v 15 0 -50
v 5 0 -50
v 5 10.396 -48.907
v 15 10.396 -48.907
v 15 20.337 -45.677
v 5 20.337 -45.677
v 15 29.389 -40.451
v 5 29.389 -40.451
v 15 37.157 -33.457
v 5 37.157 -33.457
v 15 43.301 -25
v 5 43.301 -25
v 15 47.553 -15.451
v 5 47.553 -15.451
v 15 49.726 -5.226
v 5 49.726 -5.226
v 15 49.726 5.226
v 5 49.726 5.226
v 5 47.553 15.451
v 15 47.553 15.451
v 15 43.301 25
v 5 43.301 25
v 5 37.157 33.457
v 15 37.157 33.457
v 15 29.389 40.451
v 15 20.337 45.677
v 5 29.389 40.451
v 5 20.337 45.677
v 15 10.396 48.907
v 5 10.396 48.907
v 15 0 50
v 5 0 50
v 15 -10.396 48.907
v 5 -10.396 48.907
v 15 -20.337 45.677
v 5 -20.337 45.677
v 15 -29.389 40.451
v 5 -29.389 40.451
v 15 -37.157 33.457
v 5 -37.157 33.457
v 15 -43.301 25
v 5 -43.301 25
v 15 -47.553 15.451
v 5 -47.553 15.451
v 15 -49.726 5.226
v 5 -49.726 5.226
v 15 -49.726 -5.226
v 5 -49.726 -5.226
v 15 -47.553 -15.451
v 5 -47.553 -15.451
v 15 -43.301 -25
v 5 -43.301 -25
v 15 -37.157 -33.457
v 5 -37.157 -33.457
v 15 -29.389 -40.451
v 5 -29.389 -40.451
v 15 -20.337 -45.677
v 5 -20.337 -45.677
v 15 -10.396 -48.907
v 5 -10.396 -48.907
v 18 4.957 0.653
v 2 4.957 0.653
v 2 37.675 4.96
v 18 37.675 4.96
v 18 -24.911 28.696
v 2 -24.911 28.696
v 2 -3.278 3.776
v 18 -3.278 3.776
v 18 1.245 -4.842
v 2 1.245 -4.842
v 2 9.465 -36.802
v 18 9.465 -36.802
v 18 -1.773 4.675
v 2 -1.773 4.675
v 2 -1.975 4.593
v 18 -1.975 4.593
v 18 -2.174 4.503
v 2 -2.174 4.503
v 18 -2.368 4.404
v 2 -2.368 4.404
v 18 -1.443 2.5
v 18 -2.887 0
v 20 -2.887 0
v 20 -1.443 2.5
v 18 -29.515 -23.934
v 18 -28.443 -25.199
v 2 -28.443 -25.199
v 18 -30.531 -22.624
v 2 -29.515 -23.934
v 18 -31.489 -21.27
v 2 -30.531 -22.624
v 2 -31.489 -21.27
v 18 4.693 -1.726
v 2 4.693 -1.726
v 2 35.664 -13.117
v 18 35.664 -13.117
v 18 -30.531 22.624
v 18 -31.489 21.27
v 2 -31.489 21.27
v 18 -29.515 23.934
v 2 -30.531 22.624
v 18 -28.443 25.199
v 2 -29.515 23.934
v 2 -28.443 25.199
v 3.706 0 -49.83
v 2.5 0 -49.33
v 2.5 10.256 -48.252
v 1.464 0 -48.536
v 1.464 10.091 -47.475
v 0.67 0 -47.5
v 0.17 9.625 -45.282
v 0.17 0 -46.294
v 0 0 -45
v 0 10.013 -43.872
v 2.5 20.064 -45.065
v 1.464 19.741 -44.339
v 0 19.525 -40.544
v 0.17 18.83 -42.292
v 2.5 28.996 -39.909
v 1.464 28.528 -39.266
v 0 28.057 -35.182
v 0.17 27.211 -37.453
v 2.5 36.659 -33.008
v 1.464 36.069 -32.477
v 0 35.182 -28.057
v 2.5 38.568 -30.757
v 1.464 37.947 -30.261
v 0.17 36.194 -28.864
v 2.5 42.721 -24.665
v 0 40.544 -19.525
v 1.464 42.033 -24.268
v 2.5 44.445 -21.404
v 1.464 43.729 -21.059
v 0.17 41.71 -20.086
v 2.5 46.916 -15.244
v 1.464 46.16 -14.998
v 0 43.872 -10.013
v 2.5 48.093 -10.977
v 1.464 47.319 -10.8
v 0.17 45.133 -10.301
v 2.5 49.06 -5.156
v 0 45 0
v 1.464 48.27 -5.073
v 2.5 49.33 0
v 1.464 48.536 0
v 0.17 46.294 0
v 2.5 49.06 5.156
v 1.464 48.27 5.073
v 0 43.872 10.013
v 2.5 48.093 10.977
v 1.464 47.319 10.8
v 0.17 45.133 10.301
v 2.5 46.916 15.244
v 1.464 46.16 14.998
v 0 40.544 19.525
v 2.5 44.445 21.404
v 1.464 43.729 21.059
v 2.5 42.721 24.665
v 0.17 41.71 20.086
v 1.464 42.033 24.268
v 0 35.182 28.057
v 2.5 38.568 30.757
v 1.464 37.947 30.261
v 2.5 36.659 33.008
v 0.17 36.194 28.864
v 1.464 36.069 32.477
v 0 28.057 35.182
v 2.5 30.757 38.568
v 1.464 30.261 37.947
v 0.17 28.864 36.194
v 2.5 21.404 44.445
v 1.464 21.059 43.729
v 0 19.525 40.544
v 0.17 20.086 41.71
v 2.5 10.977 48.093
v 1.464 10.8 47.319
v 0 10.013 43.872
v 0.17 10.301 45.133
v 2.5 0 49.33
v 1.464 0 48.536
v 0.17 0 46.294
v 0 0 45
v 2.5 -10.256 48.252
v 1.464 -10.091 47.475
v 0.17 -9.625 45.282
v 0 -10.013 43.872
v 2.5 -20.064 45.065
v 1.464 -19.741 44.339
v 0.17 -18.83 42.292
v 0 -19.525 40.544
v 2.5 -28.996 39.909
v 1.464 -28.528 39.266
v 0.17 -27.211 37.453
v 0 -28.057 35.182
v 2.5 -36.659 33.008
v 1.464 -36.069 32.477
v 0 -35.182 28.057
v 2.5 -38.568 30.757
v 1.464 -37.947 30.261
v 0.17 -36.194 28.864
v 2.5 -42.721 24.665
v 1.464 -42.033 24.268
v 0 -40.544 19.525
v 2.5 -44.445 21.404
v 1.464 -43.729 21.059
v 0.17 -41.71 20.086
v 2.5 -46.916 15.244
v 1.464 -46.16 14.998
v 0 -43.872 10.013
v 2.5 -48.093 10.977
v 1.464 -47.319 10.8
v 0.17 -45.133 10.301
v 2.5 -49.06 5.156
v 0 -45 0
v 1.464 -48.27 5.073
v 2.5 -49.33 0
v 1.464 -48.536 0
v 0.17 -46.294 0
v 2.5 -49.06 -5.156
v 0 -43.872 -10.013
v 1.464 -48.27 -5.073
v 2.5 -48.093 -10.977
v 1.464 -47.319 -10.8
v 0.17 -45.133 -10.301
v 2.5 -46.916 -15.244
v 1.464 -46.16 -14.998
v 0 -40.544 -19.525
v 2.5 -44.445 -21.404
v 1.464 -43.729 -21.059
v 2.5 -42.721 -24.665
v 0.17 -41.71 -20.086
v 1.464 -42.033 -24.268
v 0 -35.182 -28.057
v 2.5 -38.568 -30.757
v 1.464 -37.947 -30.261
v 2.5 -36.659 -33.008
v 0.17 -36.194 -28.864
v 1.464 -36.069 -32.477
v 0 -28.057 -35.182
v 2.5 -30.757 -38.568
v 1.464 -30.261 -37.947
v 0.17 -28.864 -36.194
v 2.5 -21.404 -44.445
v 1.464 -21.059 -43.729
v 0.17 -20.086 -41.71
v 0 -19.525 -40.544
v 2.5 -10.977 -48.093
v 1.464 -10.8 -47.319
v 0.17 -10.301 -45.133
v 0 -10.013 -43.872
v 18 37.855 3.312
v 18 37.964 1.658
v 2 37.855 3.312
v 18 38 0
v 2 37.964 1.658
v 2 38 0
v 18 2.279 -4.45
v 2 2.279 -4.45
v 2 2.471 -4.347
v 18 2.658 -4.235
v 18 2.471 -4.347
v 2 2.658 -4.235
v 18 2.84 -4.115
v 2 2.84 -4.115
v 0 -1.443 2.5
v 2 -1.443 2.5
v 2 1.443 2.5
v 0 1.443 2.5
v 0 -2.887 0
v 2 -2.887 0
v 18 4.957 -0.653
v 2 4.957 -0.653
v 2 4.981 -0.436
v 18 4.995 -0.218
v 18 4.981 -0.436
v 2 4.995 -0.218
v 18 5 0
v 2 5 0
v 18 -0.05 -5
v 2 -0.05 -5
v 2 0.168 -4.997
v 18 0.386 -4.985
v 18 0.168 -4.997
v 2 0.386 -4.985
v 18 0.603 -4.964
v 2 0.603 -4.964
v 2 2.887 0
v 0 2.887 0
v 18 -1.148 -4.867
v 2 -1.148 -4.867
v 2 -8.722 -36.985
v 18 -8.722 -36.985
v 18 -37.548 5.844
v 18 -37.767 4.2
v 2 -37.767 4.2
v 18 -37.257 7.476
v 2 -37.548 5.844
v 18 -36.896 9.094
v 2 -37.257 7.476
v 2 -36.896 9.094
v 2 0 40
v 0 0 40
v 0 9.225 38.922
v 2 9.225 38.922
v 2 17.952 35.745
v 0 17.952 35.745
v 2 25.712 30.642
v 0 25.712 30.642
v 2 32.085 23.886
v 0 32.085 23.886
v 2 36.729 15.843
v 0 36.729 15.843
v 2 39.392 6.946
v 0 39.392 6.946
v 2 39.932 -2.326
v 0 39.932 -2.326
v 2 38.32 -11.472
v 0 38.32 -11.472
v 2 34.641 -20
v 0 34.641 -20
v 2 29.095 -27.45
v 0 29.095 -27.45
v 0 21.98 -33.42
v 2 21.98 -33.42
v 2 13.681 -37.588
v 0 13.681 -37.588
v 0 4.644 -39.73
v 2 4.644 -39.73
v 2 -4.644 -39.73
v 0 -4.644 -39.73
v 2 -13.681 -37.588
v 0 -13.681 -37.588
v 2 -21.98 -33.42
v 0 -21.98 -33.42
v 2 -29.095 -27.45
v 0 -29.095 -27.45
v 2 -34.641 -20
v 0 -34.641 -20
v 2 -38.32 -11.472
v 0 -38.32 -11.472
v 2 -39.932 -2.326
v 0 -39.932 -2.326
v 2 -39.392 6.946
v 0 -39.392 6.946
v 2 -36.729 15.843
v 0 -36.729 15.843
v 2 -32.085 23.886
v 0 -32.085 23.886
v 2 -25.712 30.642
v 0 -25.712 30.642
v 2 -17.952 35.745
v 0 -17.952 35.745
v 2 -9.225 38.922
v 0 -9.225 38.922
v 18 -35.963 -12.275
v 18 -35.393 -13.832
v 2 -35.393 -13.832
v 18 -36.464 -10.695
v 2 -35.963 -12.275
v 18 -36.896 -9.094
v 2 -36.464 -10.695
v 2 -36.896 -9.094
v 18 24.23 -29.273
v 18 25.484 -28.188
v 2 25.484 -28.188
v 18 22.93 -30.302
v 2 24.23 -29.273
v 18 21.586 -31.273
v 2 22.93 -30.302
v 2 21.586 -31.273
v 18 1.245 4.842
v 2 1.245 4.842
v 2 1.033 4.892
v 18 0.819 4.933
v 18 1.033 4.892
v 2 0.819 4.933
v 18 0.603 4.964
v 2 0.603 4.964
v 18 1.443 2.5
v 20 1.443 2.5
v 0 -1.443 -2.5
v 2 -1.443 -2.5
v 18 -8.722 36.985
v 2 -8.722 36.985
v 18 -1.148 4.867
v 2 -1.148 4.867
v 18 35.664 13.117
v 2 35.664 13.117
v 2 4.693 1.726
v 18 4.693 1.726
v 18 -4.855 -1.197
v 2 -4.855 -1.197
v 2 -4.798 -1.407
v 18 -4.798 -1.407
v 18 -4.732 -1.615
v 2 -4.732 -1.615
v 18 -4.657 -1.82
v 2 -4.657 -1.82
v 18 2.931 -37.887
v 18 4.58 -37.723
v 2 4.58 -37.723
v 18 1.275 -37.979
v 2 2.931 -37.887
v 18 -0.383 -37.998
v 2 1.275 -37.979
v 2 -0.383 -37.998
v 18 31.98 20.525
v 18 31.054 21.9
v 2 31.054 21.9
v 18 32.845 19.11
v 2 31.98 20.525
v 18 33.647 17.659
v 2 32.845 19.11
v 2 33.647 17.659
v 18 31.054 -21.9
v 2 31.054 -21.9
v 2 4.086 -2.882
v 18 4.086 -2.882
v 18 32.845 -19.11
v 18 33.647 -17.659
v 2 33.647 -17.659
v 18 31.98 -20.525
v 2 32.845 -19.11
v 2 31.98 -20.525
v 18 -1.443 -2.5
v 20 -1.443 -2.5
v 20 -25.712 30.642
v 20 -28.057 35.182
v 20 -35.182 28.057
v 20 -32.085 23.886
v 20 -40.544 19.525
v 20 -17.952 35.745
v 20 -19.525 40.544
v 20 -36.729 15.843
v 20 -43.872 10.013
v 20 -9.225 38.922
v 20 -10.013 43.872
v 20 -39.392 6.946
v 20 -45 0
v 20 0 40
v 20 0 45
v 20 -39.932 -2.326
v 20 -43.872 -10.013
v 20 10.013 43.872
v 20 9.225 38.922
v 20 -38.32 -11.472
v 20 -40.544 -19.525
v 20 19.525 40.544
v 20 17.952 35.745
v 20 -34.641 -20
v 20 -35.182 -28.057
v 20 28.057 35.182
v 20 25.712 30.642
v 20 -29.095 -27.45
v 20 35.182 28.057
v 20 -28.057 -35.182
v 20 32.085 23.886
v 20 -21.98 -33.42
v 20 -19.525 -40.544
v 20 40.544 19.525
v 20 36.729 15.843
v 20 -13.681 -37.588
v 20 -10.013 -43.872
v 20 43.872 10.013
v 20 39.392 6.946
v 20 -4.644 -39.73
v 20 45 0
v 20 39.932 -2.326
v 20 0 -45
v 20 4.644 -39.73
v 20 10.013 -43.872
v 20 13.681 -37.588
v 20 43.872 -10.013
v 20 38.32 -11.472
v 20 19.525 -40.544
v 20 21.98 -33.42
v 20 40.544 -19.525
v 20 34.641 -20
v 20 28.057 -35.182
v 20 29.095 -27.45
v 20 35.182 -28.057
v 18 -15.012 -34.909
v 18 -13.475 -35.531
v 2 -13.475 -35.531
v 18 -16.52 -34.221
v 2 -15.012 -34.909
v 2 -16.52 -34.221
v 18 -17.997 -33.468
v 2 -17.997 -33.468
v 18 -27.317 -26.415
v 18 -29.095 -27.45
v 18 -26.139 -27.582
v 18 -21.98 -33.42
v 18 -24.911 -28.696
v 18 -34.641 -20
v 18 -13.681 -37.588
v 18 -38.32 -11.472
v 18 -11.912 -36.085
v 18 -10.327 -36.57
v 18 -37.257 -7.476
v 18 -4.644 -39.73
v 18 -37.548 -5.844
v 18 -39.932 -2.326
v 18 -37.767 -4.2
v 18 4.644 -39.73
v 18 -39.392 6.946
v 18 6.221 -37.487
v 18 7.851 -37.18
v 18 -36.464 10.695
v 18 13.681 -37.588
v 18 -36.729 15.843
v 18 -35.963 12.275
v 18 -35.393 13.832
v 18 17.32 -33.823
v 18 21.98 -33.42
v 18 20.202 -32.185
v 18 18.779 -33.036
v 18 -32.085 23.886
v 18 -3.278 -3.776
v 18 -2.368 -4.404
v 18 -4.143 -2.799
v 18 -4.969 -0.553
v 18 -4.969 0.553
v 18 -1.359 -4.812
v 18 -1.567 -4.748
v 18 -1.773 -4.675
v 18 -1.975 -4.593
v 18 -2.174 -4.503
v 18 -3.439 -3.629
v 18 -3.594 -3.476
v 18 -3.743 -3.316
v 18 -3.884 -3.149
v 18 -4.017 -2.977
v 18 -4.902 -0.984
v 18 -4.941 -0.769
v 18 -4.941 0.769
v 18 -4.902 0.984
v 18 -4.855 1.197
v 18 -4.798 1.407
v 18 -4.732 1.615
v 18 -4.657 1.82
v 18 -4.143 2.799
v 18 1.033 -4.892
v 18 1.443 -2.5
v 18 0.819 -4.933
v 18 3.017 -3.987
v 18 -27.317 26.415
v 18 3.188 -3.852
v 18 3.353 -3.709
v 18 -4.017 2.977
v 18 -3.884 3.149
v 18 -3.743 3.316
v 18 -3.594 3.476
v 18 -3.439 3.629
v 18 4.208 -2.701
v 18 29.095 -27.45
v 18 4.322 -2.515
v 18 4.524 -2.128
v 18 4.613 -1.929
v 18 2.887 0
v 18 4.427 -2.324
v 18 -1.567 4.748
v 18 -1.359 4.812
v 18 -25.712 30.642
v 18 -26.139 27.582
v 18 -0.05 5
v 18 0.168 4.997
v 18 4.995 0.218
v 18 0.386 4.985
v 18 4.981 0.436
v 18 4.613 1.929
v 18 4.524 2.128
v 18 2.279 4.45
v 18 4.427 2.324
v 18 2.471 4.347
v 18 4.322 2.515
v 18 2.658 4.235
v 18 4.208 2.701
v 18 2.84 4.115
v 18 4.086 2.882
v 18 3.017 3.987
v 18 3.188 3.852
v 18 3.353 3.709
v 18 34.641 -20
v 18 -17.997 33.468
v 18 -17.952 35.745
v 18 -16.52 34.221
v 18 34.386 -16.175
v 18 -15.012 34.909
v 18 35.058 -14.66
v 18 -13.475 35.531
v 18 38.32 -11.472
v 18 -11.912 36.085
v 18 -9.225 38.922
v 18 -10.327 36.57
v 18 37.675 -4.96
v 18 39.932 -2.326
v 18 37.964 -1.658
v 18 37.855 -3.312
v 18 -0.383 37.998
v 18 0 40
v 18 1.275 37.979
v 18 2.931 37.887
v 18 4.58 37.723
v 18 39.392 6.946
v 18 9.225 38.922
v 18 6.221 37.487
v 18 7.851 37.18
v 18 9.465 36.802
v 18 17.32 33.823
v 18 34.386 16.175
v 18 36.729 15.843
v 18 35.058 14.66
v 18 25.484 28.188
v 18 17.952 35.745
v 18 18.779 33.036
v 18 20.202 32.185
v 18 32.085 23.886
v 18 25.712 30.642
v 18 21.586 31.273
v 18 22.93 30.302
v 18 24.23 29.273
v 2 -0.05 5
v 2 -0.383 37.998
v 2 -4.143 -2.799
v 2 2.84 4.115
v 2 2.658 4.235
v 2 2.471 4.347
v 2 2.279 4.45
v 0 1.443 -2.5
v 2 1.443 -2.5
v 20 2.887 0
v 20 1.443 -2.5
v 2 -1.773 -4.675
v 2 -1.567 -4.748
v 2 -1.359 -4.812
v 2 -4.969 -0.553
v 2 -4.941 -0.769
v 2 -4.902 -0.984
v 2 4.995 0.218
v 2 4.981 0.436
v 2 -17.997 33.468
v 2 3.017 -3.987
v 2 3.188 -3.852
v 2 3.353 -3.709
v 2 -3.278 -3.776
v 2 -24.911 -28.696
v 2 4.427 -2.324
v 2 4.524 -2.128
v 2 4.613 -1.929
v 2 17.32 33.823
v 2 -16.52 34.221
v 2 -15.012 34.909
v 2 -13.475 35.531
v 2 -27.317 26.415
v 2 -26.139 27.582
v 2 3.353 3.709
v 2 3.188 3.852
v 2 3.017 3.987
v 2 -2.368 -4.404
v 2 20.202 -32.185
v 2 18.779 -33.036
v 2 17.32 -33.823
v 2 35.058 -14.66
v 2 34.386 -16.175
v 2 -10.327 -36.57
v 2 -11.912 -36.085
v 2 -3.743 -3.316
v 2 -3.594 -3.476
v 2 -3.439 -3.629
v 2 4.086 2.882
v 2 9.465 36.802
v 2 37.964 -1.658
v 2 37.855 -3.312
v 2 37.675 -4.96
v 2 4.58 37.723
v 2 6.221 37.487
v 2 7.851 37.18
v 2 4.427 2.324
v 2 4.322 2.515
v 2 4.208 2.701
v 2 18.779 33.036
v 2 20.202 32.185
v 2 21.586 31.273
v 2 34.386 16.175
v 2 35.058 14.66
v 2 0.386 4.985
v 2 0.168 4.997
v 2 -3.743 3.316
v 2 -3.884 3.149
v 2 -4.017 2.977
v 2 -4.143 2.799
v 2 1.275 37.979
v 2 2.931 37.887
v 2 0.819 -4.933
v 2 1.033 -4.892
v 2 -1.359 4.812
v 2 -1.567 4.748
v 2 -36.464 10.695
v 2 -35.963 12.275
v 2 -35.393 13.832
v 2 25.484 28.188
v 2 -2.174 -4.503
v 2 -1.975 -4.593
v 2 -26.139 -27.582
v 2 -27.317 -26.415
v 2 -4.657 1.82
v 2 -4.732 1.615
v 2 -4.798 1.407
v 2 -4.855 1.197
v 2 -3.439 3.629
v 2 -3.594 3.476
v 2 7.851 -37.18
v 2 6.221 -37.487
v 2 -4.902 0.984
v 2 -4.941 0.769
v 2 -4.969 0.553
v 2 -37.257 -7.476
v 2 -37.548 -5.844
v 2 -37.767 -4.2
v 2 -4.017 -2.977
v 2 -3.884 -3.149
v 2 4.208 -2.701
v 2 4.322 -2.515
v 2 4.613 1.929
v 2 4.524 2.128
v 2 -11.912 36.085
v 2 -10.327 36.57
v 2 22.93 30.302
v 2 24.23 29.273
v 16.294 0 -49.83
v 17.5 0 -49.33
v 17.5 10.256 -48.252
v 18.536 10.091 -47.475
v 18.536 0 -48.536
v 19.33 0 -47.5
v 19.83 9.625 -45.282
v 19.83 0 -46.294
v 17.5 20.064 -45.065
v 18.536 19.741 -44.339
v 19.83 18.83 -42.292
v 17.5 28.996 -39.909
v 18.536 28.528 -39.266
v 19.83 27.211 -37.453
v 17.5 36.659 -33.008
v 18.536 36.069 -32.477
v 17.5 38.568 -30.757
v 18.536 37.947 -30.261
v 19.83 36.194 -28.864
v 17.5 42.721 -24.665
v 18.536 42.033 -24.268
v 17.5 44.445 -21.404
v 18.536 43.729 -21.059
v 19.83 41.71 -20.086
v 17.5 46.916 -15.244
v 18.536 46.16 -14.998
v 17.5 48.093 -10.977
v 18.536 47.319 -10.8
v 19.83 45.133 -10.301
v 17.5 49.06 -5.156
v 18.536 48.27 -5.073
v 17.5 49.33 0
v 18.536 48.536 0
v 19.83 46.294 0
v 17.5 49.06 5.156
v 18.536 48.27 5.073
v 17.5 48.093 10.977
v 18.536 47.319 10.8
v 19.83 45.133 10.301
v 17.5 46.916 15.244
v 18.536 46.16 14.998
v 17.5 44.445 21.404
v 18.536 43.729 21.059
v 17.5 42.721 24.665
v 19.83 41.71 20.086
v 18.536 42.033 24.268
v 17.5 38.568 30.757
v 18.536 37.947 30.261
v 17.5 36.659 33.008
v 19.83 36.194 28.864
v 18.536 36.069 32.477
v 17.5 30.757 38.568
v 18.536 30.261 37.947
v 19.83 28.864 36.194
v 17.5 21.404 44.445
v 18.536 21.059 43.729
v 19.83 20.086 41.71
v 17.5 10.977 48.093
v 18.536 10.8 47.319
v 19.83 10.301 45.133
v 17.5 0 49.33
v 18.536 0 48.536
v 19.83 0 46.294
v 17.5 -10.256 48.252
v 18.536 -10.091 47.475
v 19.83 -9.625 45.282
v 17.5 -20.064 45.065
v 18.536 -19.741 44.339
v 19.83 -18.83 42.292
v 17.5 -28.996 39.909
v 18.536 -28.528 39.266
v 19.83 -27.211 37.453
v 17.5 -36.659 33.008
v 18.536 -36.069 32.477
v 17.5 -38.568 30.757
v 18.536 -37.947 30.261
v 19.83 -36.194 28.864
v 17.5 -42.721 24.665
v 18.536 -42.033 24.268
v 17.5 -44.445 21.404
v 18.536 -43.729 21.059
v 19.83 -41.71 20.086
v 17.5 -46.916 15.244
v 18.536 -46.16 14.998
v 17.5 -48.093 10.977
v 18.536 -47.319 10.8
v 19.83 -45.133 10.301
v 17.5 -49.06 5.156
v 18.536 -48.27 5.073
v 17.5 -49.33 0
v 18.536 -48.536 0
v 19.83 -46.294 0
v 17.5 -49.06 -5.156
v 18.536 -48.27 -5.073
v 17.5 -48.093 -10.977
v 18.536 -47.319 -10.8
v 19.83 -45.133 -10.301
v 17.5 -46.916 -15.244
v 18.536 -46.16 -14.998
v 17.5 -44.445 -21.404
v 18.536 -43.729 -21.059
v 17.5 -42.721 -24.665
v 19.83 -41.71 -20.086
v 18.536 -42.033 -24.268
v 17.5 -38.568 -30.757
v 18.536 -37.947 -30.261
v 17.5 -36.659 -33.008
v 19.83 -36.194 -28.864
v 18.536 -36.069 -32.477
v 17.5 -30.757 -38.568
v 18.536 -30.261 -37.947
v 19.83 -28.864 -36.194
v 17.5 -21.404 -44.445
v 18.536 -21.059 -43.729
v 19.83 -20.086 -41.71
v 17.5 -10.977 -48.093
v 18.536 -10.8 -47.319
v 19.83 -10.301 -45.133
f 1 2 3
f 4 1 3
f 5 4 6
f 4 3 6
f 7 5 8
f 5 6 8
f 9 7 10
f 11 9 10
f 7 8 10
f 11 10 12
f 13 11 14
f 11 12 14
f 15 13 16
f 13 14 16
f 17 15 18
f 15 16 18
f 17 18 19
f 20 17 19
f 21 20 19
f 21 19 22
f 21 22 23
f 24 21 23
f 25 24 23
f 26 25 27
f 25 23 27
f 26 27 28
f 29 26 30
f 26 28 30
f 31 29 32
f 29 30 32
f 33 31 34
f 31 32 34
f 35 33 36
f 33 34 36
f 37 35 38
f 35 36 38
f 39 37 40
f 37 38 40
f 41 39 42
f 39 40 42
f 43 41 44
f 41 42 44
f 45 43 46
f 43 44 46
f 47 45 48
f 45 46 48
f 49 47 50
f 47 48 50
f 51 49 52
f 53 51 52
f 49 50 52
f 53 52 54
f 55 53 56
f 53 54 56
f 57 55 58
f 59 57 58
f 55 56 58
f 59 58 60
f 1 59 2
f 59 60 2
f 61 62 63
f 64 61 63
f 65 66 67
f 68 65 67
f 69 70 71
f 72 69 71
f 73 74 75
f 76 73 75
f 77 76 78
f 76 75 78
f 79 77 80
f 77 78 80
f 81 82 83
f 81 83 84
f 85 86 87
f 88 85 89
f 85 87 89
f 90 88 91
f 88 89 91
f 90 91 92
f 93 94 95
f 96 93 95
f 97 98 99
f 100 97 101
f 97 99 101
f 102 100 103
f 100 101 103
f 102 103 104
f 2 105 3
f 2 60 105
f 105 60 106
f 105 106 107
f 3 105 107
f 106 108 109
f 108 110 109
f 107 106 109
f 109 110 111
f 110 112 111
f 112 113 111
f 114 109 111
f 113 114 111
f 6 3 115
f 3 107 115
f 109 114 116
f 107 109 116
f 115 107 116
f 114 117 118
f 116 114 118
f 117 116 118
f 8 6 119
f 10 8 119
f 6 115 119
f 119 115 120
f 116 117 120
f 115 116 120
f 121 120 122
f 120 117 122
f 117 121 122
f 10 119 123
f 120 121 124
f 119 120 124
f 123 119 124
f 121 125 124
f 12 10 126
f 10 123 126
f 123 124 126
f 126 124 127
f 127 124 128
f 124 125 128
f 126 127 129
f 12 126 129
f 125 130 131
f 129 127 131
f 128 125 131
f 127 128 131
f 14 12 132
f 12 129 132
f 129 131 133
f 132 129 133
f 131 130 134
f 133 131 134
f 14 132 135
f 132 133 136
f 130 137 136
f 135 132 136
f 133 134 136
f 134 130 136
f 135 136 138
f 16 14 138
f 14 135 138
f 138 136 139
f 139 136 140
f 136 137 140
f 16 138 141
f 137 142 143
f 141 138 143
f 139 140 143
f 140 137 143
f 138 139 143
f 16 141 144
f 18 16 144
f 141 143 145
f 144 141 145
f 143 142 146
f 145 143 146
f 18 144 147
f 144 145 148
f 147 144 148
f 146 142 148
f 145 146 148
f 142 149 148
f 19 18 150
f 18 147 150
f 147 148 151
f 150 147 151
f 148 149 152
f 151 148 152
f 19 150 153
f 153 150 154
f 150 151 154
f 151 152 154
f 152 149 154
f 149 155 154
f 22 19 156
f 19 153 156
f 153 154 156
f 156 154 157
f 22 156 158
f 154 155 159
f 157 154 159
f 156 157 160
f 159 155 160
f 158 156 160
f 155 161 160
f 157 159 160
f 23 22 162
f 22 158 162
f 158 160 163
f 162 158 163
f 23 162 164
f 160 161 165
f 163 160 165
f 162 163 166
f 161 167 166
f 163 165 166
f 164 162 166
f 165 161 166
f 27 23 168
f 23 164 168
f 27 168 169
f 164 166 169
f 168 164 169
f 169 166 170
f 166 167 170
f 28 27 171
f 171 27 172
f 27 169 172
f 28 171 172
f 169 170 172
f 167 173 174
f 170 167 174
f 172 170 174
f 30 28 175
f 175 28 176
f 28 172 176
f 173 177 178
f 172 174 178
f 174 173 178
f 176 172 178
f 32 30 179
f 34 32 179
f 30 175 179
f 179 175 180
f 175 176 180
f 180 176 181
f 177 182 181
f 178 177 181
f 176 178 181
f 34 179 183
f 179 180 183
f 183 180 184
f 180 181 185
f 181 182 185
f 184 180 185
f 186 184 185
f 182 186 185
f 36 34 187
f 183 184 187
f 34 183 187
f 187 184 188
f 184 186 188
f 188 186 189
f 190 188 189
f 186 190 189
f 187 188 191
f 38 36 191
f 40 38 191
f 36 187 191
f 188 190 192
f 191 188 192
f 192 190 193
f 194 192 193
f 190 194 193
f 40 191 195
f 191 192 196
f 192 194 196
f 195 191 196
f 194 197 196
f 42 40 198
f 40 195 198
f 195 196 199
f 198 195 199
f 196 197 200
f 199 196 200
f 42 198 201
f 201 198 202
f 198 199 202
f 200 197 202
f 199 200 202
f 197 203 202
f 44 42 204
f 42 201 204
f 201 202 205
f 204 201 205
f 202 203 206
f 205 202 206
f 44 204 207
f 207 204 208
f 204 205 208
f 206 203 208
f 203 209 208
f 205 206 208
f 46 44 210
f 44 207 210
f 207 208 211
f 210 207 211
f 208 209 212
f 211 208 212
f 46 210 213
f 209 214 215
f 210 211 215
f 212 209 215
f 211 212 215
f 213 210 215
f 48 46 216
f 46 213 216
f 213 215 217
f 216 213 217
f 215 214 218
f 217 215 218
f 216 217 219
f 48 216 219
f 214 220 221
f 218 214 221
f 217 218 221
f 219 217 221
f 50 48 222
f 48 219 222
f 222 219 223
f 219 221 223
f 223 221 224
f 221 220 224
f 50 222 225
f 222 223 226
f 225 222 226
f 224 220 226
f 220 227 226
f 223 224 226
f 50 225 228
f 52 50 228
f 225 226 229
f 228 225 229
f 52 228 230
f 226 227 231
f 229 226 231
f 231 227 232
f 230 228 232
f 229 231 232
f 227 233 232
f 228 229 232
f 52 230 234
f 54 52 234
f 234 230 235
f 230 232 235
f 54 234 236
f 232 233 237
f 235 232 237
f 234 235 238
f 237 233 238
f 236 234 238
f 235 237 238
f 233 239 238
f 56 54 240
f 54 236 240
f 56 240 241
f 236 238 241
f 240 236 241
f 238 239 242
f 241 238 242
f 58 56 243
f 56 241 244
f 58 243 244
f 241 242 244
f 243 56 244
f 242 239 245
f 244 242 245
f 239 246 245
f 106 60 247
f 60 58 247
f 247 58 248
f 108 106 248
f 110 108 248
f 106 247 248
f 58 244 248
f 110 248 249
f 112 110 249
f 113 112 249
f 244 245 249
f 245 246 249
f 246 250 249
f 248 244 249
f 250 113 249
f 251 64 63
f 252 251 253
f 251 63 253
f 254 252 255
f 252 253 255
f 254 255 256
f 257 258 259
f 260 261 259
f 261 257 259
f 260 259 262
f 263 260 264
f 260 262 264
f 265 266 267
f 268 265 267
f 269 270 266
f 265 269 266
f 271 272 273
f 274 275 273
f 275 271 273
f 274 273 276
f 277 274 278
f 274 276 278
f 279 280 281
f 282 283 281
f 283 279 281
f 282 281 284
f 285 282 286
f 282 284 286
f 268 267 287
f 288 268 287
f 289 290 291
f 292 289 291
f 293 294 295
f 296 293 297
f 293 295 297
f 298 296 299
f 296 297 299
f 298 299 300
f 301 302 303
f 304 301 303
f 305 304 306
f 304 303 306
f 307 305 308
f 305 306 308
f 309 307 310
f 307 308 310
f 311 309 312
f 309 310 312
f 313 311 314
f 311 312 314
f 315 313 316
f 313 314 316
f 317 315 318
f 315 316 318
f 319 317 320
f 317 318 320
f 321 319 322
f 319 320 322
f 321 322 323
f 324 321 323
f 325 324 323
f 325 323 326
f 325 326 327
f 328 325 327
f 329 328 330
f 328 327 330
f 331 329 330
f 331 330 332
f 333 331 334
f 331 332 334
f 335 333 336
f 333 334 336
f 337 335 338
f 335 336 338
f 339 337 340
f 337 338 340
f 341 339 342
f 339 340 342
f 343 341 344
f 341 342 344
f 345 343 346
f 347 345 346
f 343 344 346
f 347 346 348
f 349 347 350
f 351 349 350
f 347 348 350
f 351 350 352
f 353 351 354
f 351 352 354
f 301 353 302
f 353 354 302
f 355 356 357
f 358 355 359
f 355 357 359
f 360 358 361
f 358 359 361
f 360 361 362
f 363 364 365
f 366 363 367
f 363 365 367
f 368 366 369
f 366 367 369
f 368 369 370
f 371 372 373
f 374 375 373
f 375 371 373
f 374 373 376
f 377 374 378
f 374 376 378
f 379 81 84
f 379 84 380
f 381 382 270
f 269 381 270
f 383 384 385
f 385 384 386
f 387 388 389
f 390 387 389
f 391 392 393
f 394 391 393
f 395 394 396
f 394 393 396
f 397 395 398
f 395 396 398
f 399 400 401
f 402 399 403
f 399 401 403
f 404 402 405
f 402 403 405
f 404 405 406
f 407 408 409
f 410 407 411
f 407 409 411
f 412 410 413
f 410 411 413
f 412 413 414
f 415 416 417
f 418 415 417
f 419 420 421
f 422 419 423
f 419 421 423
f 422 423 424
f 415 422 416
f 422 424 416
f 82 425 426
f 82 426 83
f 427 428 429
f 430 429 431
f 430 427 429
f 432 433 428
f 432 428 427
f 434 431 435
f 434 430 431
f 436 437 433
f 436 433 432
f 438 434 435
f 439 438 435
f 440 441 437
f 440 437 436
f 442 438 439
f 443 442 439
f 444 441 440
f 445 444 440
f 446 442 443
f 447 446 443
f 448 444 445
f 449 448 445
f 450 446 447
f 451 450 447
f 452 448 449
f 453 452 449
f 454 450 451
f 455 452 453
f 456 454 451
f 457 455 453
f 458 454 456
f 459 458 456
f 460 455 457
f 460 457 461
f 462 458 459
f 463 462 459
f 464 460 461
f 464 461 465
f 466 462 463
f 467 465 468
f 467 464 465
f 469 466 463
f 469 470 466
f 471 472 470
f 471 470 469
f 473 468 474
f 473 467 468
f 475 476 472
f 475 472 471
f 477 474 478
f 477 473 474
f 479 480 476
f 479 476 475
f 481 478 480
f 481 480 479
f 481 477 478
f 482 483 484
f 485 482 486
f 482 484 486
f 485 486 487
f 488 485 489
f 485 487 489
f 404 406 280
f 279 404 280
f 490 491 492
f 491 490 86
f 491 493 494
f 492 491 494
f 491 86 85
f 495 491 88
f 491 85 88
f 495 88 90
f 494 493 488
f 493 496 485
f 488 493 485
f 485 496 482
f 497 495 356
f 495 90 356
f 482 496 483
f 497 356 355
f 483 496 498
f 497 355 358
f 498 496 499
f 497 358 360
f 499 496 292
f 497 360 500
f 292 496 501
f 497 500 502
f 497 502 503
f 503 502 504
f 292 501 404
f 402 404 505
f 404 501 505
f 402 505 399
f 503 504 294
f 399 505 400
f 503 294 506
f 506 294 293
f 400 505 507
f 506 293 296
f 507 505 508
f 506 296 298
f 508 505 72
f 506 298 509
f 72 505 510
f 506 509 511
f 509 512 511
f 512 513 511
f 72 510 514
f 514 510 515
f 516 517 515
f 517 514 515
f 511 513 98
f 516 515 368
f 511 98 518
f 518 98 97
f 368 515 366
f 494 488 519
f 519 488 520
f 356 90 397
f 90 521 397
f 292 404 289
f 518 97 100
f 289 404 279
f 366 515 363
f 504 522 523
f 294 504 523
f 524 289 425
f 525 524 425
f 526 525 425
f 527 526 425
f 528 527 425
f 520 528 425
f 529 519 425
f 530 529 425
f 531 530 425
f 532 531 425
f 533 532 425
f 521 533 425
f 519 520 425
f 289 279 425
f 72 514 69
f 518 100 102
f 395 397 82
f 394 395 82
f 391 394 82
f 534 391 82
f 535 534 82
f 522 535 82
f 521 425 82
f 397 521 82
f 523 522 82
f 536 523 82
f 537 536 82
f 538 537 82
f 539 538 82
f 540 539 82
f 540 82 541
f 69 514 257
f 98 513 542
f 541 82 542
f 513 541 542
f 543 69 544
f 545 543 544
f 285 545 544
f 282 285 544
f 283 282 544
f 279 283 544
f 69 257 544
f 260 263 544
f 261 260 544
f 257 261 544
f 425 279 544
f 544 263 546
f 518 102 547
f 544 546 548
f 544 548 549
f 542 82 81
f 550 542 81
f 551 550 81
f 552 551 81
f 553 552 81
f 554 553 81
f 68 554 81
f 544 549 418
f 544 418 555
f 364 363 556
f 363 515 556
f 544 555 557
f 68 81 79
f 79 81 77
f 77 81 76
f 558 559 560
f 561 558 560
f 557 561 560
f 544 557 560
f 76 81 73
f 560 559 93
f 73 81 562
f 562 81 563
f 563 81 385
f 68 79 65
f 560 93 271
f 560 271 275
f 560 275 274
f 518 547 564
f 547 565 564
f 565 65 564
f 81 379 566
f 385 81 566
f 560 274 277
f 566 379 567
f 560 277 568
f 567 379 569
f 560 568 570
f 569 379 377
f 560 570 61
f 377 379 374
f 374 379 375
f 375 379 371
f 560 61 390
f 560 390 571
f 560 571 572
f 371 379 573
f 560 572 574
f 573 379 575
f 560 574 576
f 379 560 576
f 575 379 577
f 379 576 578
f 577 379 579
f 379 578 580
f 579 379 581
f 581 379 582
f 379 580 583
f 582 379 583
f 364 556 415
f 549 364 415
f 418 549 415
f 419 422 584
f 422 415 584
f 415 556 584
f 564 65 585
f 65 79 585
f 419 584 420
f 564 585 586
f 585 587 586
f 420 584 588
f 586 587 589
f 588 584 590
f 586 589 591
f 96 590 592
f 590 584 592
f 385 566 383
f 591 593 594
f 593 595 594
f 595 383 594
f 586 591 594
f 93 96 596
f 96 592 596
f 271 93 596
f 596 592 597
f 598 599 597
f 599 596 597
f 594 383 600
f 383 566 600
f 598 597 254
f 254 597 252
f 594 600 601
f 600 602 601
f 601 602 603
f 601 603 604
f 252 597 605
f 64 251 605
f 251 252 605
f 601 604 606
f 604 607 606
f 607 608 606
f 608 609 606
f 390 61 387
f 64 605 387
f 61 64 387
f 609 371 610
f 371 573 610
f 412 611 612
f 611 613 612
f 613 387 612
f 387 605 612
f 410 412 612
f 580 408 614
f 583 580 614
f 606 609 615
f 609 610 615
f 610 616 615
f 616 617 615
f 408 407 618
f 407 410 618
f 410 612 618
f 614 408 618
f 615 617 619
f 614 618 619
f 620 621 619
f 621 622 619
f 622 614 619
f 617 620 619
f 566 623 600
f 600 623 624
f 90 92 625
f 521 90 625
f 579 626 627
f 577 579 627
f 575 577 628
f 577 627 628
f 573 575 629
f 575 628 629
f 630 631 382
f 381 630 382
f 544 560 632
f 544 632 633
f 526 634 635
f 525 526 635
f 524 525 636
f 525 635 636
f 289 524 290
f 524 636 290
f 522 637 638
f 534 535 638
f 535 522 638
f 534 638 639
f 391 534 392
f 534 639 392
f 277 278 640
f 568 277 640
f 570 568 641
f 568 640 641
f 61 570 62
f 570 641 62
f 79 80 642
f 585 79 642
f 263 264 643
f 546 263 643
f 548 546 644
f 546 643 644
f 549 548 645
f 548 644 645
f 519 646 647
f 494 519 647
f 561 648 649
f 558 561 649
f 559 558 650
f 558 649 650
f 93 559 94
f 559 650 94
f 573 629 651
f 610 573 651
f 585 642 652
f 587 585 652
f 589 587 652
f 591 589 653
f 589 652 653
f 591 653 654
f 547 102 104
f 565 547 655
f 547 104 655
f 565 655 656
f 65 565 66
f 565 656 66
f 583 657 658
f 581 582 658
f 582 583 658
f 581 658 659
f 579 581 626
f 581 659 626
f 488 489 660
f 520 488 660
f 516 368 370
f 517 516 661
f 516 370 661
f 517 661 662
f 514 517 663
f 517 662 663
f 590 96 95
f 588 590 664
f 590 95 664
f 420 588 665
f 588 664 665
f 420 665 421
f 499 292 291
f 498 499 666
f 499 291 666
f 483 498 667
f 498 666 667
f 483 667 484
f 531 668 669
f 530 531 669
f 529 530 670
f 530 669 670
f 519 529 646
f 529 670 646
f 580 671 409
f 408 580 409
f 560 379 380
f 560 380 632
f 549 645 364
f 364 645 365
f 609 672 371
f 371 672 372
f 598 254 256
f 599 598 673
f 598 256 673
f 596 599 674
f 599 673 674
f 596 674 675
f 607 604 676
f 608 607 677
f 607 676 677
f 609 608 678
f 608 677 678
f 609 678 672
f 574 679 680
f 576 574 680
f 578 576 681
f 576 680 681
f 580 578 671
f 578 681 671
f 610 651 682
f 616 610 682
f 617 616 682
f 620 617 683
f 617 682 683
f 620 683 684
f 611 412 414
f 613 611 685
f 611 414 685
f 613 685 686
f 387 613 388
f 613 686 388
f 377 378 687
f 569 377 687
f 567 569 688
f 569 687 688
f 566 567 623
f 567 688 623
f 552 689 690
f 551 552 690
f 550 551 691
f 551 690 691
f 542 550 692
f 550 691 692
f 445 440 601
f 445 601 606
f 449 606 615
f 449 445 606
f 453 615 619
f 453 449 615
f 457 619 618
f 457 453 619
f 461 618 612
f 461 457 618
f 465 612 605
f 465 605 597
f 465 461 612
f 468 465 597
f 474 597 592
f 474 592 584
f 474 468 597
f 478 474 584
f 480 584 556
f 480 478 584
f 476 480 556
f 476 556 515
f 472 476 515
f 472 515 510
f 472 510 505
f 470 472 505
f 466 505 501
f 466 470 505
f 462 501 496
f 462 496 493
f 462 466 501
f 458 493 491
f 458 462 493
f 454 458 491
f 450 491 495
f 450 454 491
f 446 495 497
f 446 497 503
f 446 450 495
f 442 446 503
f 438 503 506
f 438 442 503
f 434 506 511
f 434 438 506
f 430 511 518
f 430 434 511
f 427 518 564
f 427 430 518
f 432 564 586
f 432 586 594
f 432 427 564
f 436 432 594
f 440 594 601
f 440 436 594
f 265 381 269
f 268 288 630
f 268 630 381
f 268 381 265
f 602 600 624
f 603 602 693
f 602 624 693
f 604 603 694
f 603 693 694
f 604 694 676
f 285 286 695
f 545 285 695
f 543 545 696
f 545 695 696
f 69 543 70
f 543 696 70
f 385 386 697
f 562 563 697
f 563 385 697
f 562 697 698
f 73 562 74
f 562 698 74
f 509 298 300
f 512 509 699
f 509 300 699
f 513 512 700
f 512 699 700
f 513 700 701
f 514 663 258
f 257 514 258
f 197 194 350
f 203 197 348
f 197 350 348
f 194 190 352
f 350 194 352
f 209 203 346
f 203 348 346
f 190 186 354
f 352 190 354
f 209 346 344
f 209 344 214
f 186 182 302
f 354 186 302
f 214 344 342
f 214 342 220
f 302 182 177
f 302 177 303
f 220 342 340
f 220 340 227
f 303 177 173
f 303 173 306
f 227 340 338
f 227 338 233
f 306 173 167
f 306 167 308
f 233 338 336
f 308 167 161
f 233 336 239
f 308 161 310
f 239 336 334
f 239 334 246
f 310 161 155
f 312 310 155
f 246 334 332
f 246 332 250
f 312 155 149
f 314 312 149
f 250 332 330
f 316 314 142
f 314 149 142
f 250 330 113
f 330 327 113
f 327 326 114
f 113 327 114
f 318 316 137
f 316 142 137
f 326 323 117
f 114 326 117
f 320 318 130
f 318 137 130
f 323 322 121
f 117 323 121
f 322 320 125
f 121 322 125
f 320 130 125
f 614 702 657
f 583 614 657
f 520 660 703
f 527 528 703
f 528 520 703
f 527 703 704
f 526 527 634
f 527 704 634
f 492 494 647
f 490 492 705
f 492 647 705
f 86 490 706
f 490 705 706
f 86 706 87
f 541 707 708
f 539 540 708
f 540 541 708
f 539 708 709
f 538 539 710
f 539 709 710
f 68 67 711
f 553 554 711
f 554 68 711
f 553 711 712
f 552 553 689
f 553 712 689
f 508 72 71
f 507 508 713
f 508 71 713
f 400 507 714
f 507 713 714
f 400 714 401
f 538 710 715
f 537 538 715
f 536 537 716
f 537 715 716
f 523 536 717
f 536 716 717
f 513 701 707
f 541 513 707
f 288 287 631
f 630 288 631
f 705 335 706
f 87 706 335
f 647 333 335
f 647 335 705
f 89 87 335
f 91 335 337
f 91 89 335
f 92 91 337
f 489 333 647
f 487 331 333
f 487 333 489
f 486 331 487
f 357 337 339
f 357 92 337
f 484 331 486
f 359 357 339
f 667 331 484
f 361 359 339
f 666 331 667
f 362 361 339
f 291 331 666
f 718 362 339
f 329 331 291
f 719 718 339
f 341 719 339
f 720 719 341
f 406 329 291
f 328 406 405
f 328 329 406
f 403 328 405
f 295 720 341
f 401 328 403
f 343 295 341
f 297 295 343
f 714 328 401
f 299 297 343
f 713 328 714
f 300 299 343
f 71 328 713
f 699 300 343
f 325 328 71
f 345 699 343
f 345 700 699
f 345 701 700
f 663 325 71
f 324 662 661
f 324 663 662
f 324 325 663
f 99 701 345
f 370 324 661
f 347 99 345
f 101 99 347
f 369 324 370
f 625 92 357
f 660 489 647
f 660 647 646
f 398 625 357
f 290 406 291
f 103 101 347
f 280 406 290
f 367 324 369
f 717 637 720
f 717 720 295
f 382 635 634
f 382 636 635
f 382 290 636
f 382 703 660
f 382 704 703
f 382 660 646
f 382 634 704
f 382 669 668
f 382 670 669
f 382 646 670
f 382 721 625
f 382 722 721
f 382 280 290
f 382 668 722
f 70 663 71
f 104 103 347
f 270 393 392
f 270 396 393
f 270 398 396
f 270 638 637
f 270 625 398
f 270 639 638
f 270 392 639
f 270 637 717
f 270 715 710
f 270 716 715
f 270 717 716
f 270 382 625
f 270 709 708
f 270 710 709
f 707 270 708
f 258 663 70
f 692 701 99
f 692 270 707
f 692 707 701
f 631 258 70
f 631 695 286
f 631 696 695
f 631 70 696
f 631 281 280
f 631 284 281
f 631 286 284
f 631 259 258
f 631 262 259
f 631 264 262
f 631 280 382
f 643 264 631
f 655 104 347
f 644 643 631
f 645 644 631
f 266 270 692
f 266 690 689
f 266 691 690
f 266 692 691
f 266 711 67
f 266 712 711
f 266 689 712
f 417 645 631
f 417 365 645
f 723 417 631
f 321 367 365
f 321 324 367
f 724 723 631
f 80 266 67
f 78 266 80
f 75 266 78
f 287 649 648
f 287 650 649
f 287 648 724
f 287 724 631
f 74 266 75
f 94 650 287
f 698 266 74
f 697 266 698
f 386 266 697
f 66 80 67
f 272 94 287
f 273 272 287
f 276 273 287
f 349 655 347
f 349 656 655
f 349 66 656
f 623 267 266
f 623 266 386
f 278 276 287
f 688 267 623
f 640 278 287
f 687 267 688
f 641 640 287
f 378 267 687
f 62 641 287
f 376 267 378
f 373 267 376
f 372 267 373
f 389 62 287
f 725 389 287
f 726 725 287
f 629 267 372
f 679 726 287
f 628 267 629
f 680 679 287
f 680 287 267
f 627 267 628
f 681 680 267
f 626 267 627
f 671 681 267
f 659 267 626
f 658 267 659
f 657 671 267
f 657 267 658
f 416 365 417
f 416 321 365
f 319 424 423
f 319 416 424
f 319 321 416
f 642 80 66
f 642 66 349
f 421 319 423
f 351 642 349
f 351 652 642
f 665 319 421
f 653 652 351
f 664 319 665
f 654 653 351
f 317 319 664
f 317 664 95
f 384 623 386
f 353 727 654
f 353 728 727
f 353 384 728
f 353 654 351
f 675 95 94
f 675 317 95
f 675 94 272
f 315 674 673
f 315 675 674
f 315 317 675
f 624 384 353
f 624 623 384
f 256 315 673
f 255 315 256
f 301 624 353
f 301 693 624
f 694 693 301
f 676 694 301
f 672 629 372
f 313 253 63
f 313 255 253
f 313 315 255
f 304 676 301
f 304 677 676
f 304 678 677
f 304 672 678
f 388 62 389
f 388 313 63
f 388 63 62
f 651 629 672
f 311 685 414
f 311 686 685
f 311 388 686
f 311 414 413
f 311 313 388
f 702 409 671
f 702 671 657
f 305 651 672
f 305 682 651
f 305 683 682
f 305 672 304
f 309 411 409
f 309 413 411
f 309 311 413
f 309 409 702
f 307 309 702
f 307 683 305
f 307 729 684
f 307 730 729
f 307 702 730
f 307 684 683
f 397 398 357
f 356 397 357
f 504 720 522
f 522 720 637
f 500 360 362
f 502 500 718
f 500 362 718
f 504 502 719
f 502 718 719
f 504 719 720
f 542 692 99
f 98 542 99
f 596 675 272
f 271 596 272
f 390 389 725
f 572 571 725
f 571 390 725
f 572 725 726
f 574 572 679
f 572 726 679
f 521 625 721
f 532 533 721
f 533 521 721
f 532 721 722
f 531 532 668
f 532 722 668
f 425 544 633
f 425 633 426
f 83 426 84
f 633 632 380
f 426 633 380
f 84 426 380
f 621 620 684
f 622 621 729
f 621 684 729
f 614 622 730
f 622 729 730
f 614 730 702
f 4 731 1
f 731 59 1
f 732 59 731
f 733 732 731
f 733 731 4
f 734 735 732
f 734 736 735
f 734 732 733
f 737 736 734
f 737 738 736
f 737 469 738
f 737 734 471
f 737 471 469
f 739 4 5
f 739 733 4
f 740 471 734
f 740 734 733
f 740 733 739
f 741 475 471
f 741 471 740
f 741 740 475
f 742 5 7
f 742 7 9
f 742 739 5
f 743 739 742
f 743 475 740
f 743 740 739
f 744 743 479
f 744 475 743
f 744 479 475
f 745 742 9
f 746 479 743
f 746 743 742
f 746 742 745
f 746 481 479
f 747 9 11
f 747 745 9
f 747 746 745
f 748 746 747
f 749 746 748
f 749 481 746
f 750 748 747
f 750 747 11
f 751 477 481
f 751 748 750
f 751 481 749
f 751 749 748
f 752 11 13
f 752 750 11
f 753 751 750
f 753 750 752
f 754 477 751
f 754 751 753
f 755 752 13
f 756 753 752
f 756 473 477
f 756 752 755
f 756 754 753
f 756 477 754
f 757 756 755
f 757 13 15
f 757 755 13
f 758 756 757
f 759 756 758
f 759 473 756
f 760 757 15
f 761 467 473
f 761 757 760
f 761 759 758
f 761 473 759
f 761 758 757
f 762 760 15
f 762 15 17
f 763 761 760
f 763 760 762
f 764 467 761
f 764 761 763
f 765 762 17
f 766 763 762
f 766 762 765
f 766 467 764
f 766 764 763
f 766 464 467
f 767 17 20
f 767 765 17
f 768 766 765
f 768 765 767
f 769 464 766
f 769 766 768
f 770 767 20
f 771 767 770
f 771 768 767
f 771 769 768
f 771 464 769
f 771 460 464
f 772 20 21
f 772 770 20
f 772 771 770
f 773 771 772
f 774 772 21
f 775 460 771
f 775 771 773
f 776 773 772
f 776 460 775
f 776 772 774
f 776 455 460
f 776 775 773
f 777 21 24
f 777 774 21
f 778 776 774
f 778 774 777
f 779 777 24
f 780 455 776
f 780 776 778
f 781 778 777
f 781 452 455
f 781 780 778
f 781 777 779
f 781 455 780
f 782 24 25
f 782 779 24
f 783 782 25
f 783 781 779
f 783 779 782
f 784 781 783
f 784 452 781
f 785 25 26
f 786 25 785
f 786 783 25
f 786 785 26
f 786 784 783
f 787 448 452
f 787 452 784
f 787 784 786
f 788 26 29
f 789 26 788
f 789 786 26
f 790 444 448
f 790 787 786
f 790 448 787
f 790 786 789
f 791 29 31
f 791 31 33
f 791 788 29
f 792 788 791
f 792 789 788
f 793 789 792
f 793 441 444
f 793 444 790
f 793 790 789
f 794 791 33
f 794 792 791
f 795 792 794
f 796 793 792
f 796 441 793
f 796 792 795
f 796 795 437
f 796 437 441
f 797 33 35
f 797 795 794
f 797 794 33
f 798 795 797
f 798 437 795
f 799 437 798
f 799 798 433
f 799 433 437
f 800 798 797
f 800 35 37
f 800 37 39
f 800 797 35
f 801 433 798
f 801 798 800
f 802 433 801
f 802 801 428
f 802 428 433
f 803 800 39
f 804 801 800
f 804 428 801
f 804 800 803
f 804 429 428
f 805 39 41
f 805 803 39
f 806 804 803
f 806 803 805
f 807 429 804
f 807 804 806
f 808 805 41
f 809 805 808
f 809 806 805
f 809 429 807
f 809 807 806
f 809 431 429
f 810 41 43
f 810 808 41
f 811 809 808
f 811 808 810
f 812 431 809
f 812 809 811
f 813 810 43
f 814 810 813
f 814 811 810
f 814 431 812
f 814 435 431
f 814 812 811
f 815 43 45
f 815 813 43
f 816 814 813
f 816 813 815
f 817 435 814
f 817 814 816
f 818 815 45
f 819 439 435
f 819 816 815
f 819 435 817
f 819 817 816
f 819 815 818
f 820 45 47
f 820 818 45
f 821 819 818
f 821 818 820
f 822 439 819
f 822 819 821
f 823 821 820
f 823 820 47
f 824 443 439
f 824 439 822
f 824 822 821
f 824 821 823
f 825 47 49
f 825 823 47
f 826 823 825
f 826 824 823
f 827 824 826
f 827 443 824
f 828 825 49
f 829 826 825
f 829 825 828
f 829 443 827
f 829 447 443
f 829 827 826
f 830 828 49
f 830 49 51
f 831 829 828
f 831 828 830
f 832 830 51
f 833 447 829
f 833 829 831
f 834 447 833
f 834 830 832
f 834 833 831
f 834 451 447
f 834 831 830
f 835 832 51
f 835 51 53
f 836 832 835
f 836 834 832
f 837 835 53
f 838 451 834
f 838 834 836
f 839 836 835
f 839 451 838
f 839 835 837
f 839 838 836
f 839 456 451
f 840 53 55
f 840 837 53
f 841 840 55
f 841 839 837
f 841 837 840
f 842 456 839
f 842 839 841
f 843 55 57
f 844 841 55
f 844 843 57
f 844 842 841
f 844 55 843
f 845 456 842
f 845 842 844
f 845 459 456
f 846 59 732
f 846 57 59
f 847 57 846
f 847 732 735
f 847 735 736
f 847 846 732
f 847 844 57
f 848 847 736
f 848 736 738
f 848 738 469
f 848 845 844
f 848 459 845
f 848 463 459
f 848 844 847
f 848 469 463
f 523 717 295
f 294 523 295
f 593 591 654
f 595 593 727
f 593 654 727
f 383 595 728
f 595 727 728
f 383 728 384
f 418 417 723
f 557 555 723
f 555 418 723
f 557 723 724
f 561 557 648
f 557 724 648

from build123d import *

# Parameters (mm, degrees)
SKETCH1_R           = 50
BOSS_EXTRUDE1_DEPTH = 20
SKETCH2_R           = 40
CUT_EXTRUDE1_DEPTH  = 2
CUT_EXTRUDE2_DEPTH  = 73.965745388
CIRPATTERN1_COUNT   = 13
FILLET1_R           = 5
BOSS_EXTRUDE2_DEPTH = 2


with BuildPart() as part:
    # Sketch1 → Boss-Extrude1 (new body)
    with BuildSketch(Plane(origin=(0, 0, 0), x_dir=(0, 0, -1), z_dir=(1, 0, 0))):
        Circle(SKETCH1_R)
    extrude(amount=BOSS_EXTRUDE1_DEPTH)

    # Sketch2 → Cut-Extrude1 (cut)
    with BuildSketch(Plane.ZY):
        Circle(SKETCH2_R)
    cut_extrude1 = extrude(amount=-CUT_EXTRUDE1_DEPTH, mode=Mode.SUBTRACT)

    # Mirror1: Cut-Extrude1 across plane
    add(cut_extrude1.mirror(Plane(origin=(10, 0, 0), x_dir=(0, 0, 1), z_dir=(1, 0, 0))), mode=Mode.SUBTRACT)

    # Sketch3 → Cut-Extrude2 (cut, through all)
    with BuildSketch(Plane.ZY.offset(-2)):
        with BuildLine():
            Line((0, 38), (0, 5))
            ThreePointArc((0, 5), (0.327015646, 4.989294616), (0.652630961, 4.957224307))
            Line((0.652630961, 4.957224307), (4.959995304, 37.674904732))
            ThreePointArc((4.959995304, 37.674904732), (2.485318911, 37.918639083), (0, 38))
        make_face()
        with BuildLine():
            ThreePointArc((-0.652630961, 4.957224307), (-0.327015646, 4.989294616), (0, 5))
            Line((0, 5), (0, 38))
            ThreePointArc((0, 38), (-2.485318911, 37.918639083), (-4.959995304, 37.674904732))
            Line((-4.959995304, 37.674904732), (-0.652630961, 4.957224307))
        make_face()
    cut_extrude2 = extrude(amount=-CUT_EXTRUDE2_DEPTH, mode=Mode.SUBTRACT)

    # CirPattern1: Cut-Extrude2 ×13 about axis
    cirpattern1_axis = Axis((0, 0, 0), (1, 0, 0))
    for i in range(1, CIRPATTERN1_COUNT):
        add(cut_extrude2.rotate(cirpattern1_axis, i * 360 / CIRPATTERN1_COUNT), mode=Mode.SUBTRACT)

    # Fillet1
    fillet1_edges = [part.edges().sort_by_distance(p)[0] for p in [
        (0, 0, 50),
        (20, 0, 50),
    ]]
    fillet(fillet1_edges, radius=FILLET1_R)

    # Sketch4 → Boss-Extrude2 (add)
    with BuildSketch(Plane.ZY.offset(-2)):
        Polygon((0, -2.886751346), (2.5, -1.443375673), (2.5, 1.443375673), (0, 2.886751346), (-2.5, 1.443375673), (-2.5, -1.443375673), align=None)
    boss_extrude2 = extrude(amount=BOSS_EXTRUDE2_DEPTH)

    # Mirror2: Boss-Extrude2 across plane
    add(boss_extrude2.mirror(Plane(origin=(10, 0, 0), x_dir=(0, 0, 1), z_dir=(1, 0, 0))))


solid = part.part
